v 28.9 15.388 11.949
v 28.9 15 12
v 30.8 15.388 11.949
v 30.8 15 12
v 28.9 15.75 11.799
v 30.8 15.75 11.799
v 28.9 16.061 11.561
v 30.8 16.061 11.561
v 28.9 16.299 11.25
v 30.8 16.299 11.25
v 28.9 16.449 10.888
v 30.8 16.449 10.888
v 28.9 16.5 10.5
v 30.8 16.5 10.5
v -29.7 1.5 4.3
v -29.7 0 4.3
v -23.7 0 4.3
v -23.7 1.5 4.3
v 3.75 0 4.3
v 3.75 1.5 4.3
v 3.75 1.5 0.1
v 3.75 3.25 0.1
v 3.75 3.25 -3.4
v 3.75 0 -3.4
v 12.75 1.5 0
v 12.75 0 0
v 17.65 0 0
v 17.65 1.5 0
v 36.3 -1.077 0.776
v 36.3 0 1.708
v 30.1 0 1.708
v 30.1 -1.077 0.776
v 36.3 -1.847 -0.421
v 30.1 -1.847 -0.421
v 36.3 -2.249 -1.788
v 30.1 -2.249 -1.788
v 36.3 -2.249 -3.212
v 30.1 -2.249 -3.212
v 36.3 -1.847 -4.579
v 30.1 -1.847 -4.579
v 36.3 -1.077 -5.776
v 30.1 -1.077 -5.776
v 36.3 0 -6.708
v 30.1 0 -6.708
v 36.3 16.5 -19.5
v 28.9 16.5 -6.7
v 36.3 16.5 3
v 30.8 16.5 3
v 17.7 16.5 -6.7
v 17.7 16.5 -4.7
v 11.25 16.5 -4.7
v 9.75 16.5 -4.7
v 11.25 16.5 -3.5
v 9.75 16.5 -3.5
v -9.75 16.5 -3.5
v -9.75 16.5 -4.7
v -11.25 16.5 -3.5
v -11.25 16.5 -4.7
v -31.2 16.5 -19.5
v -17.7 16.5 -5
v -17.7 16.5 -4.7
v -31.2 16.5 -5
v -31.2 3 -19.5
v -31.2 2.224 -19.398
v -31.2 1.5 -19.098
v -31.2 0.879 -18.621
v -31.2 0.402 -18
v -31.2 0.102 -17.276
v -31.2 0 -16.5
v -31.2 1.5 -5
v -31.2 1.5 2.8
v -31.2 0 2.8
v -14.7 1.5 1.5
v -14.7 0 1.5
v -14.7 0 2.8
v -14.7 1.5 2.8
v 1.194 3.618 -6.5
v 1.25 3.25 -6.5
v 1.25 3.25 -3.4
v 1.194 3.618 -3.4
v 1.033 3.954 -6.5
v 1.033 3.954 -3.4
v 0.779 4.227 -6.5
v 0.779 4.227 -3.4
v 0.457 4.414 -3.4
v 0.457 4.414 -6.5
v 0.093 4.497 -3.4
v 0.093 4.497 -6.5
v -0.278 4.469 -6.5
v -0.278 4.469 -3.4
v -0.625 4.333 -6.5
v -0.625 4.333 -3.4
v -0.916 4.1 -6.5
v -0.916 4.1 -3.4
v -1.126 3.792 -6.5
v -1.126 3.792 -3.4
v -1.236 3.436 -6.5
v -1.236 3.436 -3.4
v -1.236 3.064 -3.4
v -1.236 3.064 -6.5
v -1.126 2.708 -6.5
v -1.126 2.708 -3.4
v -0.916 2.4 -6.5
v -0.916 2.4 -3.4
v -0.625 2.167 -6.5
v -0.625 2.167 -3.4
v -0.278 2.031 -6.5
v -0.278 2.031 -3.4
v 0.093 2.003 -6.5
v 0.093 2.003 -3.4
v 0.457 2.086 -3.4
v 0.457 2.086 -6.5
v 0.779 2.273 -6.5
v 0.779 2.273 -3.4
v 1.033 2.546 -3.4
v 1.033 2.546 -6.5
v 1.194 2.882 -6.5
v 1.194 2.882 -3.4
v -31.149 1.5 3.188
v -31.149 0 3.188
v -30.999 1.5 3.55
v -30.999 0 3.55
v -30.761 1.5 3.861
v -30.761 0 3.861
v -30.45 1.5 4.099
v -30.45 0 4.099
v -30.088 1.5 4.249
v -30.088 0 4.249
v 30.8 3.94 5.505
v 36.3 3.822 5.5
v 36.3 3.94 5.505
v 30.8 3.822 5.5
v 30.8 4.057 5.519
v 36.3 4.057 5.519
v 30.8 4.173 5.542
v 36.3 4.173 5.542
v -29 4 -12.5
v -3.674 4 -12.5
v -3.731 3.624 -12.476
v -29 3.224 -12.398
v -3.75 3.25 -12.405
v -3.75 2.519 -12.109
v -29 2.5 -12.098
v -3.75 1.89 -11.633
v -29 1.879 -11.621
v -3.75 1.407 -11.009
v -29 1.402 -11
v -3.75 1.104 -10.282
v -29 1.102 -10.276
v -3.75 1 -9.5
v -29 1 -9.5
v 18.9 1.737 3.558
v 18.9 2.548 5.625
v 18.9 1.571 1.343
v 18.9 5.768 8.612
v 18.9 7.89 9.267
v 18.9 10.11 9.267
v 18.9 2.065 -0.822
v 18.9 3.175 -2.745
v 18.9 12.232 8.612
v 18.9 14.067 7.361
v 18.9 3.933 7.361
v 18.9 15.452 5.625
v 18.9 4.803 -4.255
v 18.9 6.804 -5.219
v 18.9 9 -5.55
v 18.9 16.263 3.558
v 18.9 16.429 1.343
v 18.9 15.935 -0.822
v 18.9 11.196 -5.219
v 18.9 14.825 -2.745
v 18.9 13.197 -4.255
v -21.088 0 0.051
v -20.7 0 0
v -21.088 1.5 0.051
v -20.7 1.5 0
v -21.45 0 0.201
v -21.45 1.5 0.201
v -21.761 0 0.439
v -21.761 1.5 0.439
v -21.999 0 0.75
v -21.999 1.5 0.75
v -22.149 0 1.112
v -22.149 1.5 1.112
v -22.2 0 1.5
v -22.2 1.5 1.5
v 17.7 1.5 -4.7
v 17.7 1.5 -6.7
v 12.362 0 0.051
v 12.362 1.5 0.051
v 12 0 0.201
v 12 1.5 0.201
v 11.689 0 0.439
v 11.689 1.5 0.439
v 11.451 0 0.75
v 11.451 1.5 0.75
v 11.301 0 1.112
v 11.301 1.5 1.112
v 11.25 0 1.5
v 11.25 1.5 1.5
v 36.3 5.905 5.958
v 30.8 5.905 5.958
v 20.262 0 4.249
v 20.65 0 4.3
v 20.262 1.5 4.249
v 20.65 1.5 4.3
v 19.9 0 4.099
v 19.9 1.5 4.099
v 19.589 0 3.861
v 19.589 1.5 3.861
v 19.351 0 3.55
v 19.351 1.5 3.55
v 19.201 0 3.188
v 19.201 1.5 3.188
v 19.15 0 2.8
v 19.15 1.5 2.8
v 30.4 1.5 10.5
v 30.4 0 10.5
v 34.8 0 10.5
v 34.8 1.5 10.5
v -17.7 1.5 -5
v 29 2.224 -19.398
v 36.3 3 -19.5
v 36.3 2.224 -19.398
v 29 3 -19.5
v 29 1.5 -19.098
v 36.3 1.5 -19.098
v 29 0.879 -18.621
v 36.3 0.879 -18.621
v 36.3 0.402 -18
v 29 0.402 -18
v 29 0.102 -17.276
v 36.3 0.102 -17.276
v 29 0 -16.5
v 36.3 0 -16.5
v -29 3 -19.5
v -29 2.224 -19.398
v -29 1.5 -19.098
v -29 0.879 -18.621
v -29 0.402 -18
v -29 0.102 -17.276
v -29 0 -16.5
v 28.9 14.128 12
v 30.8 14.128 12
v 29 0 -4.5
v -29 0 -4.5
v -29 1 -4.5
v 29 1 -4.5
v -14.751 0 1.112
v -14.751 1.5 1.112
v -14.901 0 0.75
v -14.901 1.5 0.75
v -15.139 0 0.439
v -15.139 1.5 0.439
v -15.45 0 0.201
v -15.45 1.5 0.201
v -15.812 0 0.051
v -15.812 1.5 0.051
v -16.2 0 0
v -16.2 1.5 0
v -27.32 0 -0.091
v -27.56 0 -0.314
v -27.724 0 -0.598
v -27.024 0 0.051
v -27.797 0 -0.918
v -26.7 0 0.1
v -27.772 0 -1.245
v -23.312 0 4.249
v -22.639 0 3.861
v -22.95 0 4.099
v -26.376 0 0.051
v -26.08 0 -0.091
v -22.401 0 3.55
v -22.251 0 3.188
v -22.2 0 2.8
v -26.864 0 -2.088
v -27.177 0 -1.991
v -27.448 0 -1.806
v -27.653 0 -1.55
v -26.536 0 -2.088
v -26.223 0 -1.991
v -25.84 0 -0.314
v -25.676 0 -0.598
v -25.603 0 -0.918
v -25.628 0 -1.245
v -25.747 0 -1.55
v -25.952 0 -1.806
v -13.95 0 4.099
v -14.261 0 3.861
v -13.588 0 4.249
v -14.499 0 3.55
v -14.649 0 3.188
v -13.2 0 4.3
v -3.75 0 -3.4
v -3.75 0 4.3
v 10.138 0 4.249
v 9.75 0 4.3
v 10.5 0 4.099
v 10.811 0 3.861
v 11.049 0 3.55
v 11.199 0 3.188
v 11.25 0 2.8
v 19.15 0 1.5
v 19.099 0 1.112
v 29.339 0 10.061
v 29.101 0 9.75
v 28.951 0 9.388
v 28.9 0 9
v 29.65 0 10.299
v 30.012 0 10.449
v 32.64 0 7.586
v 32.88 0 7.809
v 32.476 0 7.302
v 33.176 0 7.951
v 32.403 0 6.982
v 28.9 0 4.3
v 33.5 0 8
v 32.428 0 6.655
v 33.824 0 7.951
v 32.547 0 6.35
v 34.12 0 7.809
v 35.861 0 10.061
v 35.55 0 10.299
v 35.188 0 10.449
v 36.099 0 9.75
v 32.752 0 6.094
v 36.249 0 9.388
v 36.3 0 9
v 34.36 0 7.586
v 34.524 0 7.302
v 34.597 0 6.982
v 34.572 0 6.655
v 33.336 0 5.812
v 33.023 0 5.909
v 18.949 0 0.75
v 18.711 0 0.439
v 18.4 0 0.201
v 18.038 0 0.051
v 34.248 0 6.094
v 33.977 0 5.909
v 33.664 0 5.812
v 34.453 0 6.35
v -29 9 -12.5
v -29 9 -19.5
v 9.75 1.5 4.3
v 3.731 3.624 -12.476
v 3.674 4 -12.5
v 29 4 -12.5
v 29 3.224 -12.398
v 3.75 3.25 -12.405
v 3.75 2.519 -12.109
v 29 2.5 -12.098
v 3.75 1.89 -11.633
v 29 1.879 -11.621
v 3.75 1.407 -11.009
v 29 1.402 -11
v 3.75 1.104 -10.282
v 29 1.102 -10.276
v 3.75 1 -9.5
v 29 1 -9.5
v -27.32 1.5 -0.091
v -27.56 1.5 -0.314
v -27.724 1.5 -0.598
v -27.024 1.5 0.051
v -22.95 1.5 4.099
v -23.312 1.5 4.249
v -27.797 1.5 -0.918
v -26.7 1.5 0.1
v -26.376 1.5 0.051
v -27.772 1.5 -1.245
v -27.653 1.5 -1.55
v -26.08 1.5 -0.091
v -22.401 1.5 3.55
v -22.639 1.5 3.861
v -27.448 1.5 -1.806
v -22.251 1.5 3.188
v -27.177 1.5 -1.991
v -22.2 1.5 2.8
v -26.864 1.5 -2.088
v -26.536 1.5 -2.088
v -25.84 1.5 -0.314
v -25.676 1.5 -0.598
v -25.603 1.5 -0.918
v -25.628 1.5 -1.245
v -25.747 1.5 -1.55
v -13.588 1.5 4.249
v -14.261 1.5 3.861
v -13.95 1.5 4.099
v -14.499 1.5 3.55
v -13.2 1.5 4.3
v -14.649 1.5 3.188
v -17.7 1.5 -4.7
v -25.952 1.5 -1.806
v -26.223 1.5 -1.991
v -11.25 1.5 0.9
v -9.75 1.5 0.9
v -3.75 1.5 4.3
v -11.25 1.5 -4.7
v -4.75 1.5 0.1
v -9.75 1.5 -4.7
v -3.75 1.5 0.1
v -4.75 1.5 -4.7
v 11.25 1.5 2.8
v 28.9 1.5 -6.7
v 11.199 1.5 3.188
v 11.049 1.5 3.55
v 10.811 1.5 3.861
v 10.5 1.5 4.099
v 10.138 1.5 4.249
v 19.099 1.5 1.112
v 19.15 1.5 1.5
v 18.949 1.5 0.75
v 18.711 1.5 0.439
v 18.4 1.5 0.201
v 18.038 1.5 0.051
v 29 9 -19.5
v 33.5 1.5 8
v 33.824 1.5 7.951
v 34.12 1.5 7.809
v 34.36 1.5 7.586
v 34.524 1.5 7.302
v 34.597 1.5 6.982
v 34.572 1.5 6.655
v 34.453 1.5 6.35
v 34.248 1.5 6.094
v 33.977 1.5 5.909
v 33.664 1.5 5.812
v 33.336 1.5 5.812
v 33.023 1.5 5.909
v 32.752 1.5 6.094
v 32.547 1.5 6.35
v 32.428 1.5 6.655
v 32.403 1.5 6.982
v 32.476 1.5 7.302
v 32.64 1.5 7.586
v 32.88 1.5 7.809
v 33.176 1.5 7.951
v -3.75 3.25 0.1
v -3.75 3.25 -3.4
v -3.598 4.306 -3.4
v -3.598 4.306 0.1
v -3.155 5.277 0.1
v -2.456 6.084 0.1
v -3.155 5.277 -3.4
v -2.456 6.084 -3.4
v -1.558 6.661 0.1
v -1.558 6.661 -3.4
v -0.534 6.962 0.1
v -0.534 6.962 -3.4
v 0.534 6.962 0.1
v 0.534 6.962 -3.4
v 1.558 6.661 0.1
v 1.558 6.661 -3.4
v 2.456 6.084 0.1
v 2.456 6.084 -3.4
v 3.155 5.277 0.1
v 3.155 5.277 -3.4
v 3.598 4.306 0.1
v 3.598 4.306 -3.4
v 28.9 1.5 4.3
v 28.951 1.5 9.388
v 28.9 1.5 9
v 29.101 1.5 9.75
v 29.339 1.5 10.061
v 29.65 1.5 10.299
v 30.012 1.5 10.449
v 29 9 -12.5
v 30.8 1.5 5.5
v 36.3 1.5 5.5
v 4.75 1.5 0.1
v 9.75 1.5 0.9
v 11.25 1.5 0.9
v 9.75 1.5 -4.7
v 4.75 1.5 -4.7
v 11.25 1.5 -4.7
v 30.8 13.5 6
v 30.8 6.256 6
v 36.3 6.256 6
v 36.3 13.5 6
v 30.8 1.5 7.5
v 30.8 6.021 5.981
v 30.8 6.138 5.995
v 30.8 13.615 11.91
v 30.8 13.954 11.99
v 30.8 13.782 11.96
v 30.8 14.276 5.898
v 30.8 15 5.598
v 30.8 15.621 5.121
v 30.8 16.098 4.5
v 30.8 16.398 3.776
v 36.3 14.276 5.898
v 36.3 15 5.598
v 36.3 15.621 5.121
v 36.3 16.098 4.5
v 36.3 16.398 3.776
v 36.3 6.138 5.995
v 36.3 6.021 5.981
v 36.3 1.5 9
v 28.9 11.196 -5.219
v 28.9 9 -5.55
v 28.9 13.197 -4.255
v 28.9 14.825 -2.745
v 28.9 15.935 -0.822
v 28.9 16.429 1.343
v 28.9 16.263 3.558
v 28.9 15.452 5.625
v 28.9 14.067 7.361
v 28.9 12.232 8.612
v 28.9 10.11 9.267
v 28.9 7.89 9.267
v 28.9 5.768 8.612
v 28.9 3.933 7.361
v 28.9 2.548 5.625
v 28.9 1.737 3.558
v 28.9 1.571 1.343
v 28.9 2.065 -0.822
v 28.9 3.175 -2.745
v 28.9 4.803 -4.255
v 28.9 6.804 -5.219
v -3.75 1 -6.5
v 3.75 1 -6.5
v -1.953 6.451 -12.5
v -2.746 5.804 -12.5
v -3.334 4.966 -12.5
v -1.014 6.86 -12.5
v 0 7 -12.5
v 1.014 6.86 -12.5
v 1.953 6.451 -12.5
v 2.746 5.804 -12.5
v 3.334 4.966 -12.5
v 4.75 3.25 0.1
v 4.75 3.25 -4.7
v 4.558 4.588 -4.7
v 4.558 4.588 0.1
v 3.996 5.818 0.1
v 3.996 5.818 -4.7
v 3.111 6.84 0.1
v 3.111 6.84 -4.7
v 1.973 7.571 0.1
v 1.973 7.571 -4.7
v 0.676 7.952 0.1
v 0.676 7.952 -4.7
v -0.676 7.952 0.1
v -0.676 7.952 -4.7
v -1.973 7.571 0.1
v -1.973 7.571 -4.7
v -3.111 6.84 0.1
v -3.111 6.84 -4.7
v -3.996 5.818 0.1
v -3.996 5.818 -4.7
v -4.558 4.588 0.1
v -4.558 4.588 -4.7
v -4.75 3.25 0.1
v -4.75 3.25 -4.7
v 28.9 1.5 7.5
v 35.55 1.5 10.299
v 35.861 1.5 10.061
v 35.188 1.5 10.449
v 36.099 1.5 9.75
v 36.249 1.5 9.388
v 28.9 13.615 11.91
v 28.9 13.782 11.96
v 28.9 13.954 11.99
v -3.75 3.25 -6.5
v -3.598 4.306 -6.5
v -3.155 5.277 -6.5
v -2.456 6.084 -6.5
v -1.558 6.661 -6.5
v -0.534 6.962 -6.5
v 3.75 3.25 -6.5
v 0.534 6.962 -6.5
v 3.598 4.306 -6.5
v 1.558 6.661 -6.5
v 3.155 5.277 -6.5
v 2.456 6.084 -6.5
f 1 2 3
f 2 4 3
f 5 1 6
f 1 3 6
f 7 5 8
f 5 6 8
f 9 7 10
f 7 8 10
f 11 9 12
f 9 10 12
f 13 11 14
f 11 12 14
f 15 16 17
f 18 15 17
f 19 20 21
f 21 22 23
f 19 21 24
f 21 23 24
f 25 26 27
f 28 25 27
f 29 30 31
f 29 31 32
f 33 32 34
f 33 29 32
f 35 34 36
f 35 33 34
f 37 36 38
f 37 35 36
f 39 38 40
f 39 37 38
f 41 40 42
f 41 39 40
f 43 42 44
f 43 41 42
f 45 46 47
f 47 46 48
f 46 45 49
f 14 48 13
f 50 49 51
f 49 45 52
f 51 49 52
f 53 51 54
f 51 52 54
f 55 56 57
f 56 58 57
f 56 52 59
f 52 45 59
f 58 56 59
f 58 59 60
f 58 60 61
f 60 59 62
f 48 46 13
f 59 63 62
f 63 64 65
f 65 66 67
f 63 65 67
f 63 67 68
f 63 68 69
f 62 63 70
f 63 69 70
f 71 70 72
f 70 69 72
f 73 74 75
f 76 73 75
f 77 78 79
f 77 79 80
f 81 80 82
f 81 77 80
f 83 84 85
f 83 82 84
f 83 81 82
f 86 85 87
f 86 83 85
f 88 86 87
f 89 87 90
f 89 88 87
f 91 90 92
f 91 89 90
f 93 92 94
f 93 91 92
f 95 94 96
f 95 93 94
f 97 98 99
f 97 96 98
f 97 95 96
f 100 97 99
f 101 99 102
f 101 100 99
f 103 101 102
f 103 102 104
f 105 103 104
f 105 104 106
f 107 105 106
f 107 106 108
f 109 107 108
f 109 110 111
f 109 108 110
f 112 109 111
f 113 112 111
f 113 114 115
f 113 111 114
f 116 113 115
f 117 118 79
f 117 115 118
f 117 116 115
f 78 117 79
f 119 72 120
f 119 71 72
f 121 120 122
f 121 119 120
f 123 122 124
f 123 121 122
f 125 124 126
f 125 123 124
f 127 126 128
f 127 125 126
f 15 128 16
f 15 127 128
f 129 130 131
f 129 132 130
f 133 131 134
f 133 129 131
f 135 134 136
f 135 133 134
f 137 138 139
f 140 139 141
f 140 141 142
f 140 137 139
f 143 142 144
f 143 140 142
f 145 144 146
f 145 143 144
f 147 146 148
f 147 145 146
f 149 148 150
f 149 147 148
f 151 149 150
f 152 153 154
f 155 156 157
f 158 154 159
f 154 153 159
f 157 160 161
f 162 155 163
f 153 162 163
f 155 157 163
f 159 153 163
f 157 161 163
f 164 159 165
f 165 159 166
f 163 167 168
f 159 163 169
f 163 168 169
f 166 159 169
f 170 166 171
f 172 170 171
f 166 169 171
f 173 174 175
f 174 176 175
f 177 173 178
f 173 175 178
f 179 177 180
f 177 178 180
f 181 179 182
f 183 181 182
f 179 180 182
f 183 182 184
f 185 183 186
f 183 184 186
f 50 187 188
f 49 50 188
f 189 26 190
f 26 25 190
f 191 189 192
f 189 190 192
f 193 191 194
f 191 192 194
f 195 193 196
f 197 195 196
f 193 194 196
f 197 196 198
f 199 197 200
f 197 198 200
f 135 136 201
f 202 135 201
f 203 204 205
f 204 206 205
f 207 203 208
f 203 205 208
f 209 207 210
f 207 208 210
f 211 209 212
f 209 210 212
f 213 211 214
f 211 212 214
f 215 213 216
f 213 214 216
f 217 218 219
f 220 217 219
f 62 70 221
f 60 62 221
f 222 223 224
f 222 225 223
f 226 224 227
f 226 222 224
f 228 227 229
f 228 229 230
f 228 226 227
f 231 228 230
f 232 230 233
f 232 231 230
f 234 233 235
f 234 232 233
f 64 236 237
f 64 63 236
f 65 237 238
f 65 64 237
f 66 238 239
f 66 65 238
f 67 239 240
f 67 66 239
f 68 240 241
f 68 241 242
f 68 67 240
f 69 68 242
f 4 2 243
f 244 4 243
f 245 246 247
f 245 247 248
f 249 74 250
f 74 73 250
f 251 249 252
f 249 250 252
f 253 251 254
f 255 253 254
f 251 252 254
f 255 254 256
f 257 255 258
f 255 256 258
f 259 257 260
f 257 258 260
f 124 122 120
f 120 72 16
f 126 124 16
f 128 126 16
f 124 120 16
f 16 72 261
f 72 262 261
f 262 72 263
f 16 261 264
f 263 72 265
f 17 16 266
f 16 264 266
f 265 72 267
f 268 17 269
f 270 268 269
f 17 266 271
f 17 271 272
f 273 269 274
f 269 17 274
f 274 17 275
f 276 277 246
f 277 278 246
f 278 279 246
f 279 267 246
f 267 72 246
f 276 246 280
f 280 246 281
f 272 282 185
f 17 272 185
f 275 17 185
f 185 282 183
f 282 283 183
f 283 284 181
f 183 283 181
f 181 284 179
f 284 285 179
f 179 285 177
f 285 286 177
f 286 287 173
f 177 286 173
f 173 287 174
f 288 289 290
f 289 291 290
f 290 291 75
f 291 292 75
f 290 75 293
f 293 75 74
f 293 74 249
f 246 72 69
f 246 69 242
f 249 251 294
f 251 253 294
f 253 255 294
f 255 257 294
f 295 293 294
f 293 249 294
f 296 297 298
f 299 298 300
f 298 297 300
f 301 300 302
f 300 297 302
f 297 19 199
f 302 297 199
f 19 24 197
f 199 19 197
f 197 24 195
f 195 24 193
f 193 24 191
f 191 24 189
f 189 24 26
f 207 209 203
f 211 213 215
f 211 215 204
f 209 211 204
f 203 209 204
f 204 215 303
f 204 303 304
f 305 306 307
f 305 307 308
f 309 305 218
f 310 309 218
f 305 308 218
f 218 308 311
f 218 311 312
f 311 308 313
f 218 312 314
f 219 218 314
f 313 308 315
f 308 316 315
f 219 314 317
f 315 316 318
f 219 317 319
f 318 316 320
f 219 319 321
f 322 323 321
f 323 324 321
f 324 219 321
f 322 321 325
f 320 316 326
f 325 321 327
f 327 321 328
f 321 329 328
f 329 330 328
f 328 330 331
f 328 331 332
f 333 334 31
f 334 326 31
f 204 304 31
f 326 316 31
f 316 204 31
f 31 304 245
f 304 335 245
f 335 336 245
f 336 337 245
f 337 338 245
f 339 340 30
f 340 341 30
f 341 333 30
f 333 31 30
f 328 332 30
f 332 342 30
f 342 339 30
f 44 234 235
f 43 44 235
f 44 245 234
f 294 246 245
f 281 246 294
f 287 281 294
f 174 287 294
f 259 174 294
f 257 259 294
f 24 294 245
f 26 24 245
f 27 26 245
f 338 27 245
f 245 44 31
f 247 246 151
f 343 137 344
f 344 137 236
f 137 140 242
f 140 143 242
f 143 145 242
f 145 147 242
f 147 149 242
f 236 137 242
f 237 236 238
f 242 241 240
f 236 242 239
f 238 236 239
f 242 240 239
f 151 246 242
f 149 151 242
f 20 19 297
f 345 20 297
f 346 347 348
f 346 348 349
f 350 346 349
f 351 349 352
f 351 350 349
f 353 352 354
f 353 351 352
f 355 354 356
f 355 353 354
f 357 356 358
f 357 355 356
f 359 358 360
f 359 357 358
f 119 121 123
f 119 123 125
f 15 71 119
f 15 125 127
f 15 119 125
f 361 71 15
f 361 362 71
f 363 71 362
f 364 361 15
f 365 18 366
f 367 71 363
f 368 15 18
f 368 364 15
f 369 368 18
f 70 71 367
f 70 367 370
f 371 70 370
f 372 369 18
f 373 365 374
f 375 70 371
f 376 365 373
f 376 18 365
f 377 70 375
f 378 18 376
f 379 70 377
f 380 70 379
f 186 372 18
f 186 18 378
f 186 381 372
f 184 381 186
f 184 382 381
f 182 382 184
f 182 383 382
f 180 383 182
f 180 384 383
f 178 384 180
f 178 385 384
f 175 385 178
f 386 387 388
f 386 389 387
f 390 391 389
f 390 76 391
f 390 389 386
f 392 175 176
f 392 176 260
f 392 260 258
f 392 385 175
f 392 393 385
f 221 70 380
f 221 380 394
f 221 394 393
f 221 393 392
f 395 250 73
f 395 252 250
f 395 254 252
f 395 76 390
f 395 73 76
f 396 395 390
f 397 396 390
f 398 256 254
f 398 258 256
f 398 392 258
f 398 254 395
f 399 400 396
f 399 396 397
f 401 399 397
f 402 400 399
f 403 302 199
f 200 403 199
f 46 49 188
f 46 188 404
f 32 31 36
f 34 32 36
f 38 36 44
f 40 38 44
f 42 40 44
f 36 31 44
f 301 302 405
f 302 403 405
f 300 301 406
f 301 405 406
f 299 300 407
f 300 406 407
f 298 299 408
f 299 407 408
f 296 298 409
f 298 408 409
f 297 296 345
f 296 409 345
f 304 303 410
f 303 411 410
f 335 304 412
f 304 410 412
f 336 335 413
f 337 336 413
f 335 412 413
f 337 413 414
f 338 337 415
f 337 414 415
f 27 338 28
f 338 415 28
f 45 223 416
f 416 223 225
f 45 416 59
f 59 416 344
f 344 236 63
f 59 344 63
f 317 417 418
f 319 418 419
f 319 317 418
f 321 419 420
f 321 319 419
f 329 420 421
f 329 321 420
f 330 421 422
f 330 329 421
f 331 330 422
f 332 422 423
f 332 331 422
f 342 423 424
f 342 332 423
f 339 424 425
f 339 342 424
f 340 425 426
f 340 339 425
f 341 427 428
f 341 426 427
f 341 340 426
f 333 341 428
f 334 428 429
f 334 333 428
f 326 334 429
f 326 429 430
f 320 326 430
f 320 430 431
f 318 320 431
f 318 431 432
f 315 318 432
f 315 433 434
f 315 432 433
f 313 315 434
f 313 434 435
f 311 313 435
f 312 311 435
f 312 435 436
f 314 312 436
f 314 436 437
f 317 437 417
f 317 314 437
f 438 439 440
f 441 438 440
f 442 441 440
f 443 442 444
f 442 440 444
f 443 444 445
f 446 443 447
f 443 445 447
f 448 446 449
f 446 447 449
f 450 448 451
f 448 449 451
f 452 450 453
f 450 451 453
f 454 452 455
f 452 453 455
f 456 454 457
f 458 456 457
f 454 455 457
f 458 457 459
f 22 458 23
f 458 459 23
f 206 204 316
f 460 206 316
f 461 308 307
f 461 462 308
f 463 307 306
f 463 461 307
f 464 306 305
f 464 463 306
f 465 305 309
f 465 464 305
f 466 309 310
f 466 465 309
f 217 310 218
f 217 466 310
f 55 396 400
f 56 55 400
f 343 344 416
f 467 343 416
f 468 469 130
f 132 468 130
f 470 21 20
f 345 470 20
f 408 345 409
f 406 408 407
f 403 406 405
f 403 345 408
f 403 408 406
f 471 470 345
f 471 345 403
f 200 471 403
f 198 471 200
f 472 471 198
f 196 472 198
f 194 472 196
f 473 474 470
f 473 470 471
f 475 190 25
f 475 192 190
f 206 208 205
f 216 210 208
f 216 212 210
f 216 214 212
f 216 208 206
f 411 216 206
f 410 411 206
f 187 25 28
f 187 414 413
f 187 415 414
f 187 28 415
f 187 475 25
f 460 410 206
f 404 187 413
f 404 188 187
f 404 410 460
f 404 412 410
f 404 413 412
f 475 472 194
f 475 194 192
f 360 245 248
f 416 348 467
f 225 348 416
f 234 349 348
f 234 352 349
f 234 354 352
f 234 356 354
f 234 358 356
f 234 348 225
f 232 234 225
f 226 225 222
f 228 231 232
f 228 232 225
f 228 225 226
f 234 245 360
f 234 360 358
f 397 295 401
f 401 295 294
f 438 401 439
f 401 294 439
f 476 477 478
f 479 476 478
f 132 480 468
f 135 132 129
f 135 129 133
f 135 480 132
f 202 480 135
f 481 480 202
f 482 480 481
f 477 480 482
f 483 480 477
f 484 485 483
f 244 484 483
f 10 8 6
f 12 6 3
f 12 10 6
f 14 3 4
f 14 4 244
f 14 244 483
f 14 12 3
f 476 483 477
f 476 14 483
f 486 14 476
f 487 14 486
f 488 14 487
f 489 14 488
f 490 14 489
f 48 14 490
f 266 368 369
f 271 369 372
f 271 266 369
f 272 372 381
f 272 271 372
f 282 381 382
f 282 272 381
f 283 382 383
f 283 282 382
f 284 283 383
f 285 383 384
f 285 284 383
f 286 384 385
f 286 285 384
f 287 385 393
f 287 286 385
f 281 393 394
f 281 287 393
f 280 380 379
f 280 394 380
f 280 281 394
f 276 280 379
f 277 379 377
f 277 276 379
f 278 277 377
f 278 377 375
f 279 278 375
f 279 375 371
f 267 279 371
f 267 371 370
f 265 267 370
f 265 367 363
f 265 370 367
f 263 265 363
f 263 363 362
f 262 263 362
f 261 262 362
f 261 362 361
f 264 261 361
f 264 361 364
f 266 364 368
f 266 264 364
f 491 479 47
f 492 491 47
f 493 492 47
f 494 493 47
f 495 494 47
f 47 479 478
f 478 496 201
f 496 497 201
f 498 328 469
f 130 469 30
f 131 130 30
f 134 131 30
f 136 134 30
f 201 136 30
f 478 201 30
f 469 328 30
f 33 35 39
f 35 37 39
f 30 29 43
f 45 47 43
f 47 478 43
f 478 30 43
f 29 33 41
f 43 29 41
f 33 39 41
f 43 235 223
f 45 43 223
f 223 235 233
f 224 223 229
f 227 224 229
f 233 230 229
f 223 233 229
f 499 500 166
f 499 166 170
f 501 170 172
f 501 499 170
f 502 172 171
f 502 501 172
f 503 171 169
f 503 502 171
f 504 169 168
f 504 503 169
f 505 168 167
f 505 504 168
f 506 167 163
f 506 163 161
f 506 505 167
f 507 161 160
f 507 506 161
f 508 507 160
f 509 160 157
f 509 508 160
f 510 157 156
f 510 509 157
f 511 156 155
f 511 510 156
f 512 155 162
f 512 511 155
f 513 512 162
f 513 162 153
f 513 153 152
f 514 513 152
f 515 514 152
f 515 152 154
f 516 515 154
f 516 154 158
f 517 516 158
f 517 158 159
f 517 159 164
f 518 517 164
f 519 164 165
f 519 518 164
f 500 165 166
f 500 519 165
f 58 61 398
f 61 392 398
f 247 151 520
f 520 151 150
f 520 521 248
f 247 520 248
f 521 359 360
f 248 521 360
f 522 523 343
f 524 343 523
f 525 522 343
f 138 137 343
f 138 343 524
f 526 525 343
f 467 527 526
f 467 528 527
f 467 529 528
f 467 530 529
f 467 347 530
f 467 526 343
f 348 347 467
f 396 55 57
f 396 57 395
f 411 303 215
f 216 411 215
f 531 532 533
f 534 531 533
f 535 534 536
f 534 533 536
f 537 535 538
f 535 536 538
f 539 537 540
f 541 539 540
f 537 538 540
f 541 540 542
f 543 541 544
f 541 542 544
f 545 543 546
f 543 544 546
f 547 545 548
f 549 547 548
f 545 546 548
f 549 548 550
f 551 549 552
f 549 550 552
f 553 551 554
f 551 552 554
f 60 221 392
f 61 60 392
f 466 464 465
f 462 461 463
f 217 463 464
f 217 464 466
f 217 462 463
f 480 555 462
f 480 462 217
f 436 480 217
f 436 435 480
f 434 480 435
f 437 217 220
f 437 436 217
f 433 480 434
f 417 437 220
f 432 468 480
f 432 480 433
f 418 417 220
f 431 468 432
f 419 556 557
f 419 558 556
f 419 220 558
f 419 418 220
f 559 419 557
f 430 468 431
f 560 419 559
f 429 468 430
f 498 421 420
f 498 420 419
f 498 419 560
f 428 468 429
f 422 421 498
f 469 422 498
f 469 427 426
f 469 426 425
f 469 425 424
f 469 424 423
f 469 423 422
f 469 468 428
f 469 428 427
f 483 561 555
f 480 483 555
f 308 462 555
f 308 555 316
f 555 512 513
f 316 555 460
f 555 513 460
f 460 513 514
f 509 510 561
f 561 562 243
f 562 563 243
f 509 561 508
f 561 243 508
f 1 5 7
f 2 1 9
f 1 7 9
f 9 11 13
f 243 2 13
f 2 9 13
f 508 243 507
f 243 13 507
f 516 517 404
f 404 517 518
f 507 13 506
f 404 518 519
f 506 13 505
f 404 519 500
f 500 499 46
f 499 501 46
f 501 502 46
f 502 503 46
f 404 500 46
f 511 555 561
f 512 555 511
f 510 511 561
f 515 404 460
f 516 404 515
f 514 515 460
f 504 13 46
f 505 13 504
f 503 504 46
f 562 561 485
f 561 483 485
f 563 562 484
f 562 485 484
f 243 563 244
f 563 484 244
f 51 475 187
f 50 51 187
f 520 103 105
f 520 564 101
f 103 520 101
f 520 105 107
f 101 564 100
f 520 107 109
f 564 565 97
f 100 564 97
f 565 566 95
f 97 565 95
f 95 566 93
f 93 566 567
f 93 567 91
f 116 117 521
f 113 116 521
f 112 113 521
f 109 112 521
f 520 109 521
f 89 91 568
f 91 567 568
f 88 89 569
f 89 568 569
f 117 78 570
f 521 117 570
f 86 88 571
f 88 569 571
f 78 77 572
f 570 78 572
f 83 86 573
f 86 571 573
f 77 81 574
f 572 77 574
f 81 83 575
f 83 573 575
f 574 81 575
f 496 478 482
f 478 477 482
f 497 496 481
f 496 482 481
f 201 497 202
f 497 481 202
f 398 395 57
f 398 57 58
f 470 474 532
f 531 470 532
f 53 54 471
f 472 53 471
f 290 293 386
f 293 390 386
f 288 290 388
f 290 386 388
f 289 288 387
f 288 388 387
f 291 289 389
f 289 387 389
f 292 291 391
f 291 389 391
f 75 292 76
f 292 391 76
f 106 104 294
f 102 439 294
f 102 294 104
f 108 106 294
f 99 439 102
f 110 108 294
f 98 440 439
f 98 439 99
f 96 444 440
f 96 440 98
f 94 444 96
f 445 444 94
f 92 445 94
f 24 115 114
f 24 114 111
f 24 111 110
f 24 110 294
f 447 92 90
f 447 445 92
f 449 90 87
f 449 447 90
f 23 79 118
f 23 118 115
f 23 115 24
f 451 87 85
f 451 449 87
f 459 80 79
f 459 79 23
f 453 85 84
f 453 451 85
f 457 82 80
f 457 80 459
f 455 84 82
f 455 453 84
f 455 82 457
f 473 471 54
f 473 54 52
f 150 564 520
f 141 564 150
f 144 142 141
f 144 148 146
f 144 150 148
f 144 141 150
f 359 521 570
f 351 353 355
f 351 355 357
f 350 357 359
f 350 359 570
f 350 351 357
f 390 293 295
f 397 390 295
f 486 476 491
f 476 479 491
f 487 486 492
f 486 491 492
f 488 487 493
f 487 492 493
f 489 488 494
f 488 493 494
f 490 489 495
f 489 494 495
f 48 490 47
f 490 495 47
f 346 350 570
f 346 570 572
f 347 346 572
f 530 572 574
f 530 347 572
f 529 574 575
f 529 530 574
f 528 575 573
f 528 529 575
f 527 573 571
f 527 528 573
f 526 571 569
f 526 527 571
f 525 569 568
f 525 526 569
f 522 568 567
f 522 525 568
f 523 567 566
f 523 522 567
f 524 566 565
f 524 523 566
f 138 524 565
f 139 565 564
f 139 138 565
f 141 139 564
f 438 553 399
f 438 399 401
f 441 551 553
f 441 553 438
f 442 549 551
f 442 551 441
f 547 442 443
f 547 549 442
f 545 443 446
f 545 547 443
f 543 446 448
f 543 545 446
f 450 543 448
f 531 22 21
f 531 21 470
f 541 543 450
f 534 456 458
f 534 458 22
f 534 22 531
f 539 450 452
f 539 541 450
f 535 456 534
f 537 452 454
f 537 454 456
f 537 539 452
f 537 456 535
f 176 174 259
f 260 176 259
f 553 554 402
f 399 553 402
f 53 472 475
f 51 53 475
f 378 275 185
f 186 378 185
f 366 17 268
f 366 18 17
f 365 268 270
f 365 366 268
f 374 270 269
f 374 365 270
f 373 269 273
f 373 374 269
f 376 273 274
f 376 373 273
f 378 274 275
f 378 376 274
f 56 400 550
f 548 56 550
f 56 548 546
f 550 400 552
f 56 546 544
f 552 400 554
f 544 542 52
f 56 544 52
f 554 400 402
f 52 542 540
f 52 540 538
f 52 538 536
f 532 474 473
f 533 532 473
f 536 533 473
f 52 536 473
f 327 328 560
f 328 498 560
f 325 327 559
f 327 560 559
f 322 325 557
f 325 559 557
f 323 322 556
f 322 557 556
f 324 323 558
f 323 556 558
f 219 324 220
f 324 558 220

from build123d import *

# Parameters (mm, degrees)
EXTRUDE_1_DEPTH          = 1.5
EXTRUDE_2_DEPTH          = 16.5
EXTRUDE_START            = 36.3
EXTRUDE_3_DEPTH          = 6.2
EXTRUDE_START_2          = 28.9
EXTRUDE_4_DEPTH          = 1.9
CUT_EXTRUDE_START        = 36.3
CUT_EXTRUDE_1_DEPTH      = 5.5
SKETCH_3_6_R             = 7.45
EXTRUDE_7_DEPTH          = 10
FILLET_1_R               = 1.5
FILLET_2_R               = 1.5
FILLET_3_R               = 1.5
FILLET_4_R               = 3
EXTRUDE_START_3          = -4.7
EXTRUDE_5_DEPTH          = 4.8
CUT_EXTRUDE_START_2      = -3.4
CUT_EXTRUDE_2_OUTLINE_W  = 7.5
CUT_EXTRUDE_2_OUTLINE_H  = 1.5
CUT_EXTRUDE_2_DEPTH      = 0.5
EXTRUDE_6_DEPTH          = 1.3
CUT_EXTRUDE_START_3      = -19.5
CUT_EXTRUDE_3_DEPTH      = 13
CUT_EXTRUDE_4_DEPTH      = 44.001744151
CUT_EXTRUDE_4_DEPTH_BACK = 44.001744151
SKETCH_5_R               = 1.25
EXTRUDE_START_4          = 9.75
EXTRUDE_8_DEPTH          = 1.5
EXTRUDE_START_5          = -9.75
EXTRUDE_9_DEPTH          = 1.5
SKETCH_7_W               = 29
SKETCH_7_H               = 7
CUT_EXTRUDE_5_DEPTH      = 9
SKETCH_7_3_W             = 29
SKETCH_7_3_H             = 8
CUT_EXTRUDE_6_DEPTH      = 1
FILLET_5_R               = 3
FILLET_6_R               = 3
SKETCH_1_4_R             = 1.1
CUT_EXTRUDE_7_DEPTH      = 2


# Read off the part's stored shape, not the designer's step: Бобышка-Вытянуть5, Вырез-Вытянуть2, Бобышка-Вытянуть6, Вырез-Вытянуть3
with BuildPart() as part:
    # Эскиз1 → Бобышка-Вытянуть1 (new body)
    with BuildSketch(Plane(origin=(0, 0, 0), x_dir=(1, 0, 0), z_dir=(0, 1, 0))):
        Polygon((36.3, 19.5), (-31.2, 19.5), (-31.2, -4.3), (-22.2, -4.3), (-22.2, 0), (-14.7, 0), (-14.7, -4.3), (-3.75, -4.3), (-3.75, 2.9), (3.75, 2.9), (3.75, -4.3), (11.25, -4.3), (11.25, 0), (19.15, 0), (19.15, -4.3), (28.9, -4.3), (28.9, -10.5), (36.3, -10.5), align=None)
    extrude(amount=EXTRUDE_1_DEPTH)

    # Эскиз1<3> → Бобышка-Вытянуть2 (add)
    with BuildSketch(Plane(origin=(0, 0, 0), x_dir=(1, 0, 0), z_dir=(0, 1, 0))):
        Polygon((36.3, 19.5), (-31.2, 19.5), (-31.2, 5), (-17.7, 5), (-17.7, 4.7), (17.7, 4.7), (17.7, 6.7), (28.9, 6.7), (28.9, -6), (36.3, -6), align=None)
    extrude(amount=EXTRUDE_2_DEPTH)

    # Эскиз3 → Бобышка-Вытянуть3 (add)
    with BuildSketch(Plane(origin=(0, 0, 0), x_dir=(0, 0, -1), z_dir=(1, 0, 0)).offset(EXTRUDE_START)):
        with BuildLine():
            Line((0, 1.5), (0, 0))
            Line((0, 0), (6.708325083, 0))
            ThreePointArc((6.708325083, 0), (7.092746426, 0.723467616), (7.35386444, 1.5))
            Line((7.35386444, 1.5), (0, 1.5))
        make_face()
        with BuildLine():
            Line((6.708325083, 0), (0, 0))
            Line((0, 0), (0, 1.5))
            Line((0, 1.5), (-2.35386444, 1.5))
            ThreePointArc((-2.35386444, 1.5), (1.683495092, -2.232881484), (6.708325083, 0))
        make_face()
    extrude(amount=-EXTRUDE_3_DEPTH)

    # Эскиз3<4> → Бобышка-Вытянуть4 (add)
    with BuildSketch(Plane(origin=(0, 0, 0), x_dir=(0, 0, -1), z_dir=(1, 0, 0)).offset(EXTRUDE_START_2)):
        Polygon((-7.5, 1.5), (-6, 1.5), (-6, 16.5), (-12, 16.5), (-12, 13.863648388), align=None)
    extrude(amount=EXTRUDE_4_DEPTH)

    # Эскиз3<5> → Вырез-Вытянуть1 (cut)
    with BuildSketch(Plane(origin=(0, 0, 0), x_dir=(0, 0, -1), z_dir=(1, 0, 0)).offset(CUT_EXTRUDE_START)):
        Polygon((-6, 1.5), (-5.5, 1.5), (-5.5, 4), (-6, 6.078204319), align=None)
    extrude(amount=-CUT_EXTRUDE_1_DEPTH, mode=Mode.SUBTRACT)

    # Эскиз3<6> → Бобышка-Вытянуть7 (add)
    with BuildSketch(Plane(origin=(0, 0, 0), x_dir=(0, 0, -1), z_dir=(1, 0, 0)).offset(EXTRUDE_START_2)):
        with Locations((-1.9, 9)):
            Circle(SKETCH_3_6_R)
    extrude(amount=-EXTRUDE_7_DEPTH)

    # Скругление1
    fillet_1_edges = [part.edges().sort_by_distance(p)[0] for p in [
        (36.3, 0.75, 10.5),
        (28.9, 0.75, 10.5),
        (19.15, 0.75, 4.3),
        (19.15, 0.75, 0),
        (11.25, 0.75, 0),
        (11.25, 0.75, 4.3),
        (-14.7, 0.75, 4.3),
        (-14.7, 0.75, 0),
        (-22.2, 0.75, 0),
        (-22.2, 0.75, 4.3),
        (-31.2, 0.75, 4.3),
    ]]
    fillet(fillet_1_edges, radius=FILLET_1_R)

    # Скругление2
    fillet_2_edges = [part.edges().sort_by_distance(p)[0] for p in [
        (29.85, 16.5, 12),
        (29.85, 13.863648388, 12),
    ]]
    fillet(fillet_2_edges, radius=FILLET_2_R)

    # Скругление3
    fillet_3_edges = [part.edges().sort_by_distance(p)[0] for p in [
        (33.55, 6.078204319, 6),
        (33.55, 4, 5.5),
    ]]
    fillet(fillet_3_edges, radius=FILLET_3_R)

    # Скругление4
    fillet_4_edges = [part.edges().sort_by_distance(p)[0] for p in [
        (33.55, 16.5, 6),
    ]]
    fillet(fillet_4_edges, radius=FILLET_4_R)

    # Бобышка-Вытянуть5 outline → Бобышка-Вытянуть5 (add)
    with BuildSketch(Plane.XY.offset(EXTRUDE_START_3)):
        with BuildLine():
            Line((-3.75, 1.5), (-3.75, 3.25))
            ThreePointArc((-3.75, 3.25), (0, 7), (3.75, 3.25))
            Line((3.75, 3.25), (3.75, 1.5))
            Line((3.75, 1.5), (4.75, 1.5))
            Line((4.75, 1.5), (4.75, 3.25))
            ThreePointArc((4.75, 3.25), (0, 8), (-4.75, 3.25))
            Line((-4.75, 3.25), (-4.75, 1.5))
            Line((-4.75, 1.5), (-3.75, 1.5))
        make_face()
    extrude(amount=EXTRUDE_5_DEPTH)

    # Вырез-Вытянуть2 outline → Вырез-Вытянуть2 (cut)
    with BuildSketch(Plane.XY.offset(CUT_EXTRUDE_START_2)):
        with Locations((0, 0.75)):
            Rectangle(CUT_EXTRUDE_2_OUTLINE_W, CUT_EXTRUDE_2_OUTLINE_H)
    extrude(amount=CUT_EXTRUDE_2_DEPTH, mode=Mode.SUBTRACT)

    # Бобышка-Вытянуть6 outline → Бобышка-Вытянуть6 (add)
    with BuildSketch(Plane.XY.offset(EXTRUDE_START_3)):
        with BuildLine():
            Line((-3.75, 1.5), (3.75, 1.5))
            Line((3.75, 1.5), (3.75, 3.25))
            ThreePointArc((3.75, 3.25), (0, 7), (-3.75, 3.25))
            Line((-3.75, 3.25), (-3.75, 1.5))
        make_face()
    extrude(amount=EXTRUDE_6_DEPTH)

    # Вырез-Вытянуть3 outline → Вырез-Вытянуть3 (cut)
    with BuildSketch(Plane.XY.offset(CUT_EXTRUDE_START_3)):
        with BuildLine():
            Line((-3.75, 3.25), (-3.75, 0))
            Line((-3.75, 0), (3.75, 0))
            Line((3.75, 0), (3.75, 3.25))
            ThreePointArc((3.75, 3.25), (0, 7), (-3.75, 3.25))
        make_face()
    extrude(amount=CUT_EXTRUDE_3_DEPTH, mode=Mode.SUBTRACT)

    # Эскиз5 → Вырез-Вытянуть4 (cut, two sides: drawn at the far end of the back side and taken through both)
    with BuildSketch(Plane.XY.offset(-3.4).offset(-CUT_EXTRUDE_4_DEPTH_BACK)):
        with Locations((0, 3.25)):
            Circle(SKETCH_5_R)
    extrude(amount=CUT_EXTRUDE_4_DEPTH + CUT_EXTRUDE_4_DEPTH_BACK, mode=Mode.SUBTRACT)

    # Эскиз6 → Бобышка-Вытянуть8 (add)
    with BuildSketch(Plane(origin=(0, 0, 0), x_dir=(0, 0, -1), z_dir=(1, 0, 0)).offset(EXTRUDE_START_4)):
        Polygon((4.7, 1.5), (4.7, 16.5), (3.5, 16.5), (-0.9, 1.5), align=None)
    extrude(amount=EXTRUDE_8_DEPTH)

    # Эскиз6<4> → Бобышка-Вытянуть9 (add)
    with BuildSketch(Plane(origin=(0, 0, 0), x_dir=(0, 0, -1), z_dir=(1, 0, 0)).offset(EXTRUDE_START_5)):
        Polygon((4.7, 1.5), (4.7, 16.5), (3.5, 16.5), (-0.9, 1.5), align=None)
    extrude(amount=-EXTRUDE_9_DEPTH)

    # Эскиз7 → Вырез-Вытянуть5 (cut)
    with BuildSketch(Plane(origin=(0, 0, 0), x_dir=(1, 0, 0), z_dir=(0, 1, 0))):
        with Locations((14.5, 16)):
            Rectangle(SKETCH_7_W, SKETCH_7_H)
        with Locations((-14.5, 16)):
            Rectangle(SKETCH_7_W, SKETCH_7_H)
    extrude(amount=CUT_EXTRUDE_5_DEPTH, mode=Mode.SUBTRACT)

    # Эскиз7<3> → Вырез-Вытянуть6 (cut)
    with BuildSketch(Plane(origin=(0, 0, 0), x_dir=(1, 0, 0), z_dir=(0, 1, 0))):
        with Locations((14.5, 8.5)):
            Rectangle(SKETCH_7_3_W, SKETCH_7_3_H)
        with Locations((-14.5, 8.5)):
            Rectangle(SKETCH_7_3_W, SKETCH_7_3_H)
    extrude(amount=CUT_EXTRUDE_6_DEPTH, mode=Mode.SUBTRACT)

    # Скругление5
    fillet_5_edges = [part.edges().sort_by_distance(p)[0] for p in [
        (-16.375, 1, -12.5),
        (16.375, 1, -12.5),
    ]]
    fillet(fillet_5_edges, radius=FILLET_5_R)

    # Скругление6
    fillet_6_edges = [part.edges().sort_by_distance(p)[0] for p in [
        (-30.1, 0, -19.5),
        (32.65, 0, -19.5),
    ]]
    fillet(fillet_6_edges, radius=FILLET_6_R)

    # Эскиз1<4> → Вырез-Вытянуть7 (cut)
    with BuildSketch(Plane(origin=(0, 0, 0), x_dir=(1, 0, 0), z_dir=(0, 1, 0))):
        with Locations(Location((-26.7, 1, 0), (0, 0, 270))):
            Circle(SKETCH_1_4_R)
        with Locations(Location((33.5, -6.9, 0), (0, 0, 270))):
            Circle(SKETCH_1_4_R)
    extrude(amount=CUT_EXTRUDE_7_DEPTH, mode=Mode.SUBTRACT)


solid = part.part
